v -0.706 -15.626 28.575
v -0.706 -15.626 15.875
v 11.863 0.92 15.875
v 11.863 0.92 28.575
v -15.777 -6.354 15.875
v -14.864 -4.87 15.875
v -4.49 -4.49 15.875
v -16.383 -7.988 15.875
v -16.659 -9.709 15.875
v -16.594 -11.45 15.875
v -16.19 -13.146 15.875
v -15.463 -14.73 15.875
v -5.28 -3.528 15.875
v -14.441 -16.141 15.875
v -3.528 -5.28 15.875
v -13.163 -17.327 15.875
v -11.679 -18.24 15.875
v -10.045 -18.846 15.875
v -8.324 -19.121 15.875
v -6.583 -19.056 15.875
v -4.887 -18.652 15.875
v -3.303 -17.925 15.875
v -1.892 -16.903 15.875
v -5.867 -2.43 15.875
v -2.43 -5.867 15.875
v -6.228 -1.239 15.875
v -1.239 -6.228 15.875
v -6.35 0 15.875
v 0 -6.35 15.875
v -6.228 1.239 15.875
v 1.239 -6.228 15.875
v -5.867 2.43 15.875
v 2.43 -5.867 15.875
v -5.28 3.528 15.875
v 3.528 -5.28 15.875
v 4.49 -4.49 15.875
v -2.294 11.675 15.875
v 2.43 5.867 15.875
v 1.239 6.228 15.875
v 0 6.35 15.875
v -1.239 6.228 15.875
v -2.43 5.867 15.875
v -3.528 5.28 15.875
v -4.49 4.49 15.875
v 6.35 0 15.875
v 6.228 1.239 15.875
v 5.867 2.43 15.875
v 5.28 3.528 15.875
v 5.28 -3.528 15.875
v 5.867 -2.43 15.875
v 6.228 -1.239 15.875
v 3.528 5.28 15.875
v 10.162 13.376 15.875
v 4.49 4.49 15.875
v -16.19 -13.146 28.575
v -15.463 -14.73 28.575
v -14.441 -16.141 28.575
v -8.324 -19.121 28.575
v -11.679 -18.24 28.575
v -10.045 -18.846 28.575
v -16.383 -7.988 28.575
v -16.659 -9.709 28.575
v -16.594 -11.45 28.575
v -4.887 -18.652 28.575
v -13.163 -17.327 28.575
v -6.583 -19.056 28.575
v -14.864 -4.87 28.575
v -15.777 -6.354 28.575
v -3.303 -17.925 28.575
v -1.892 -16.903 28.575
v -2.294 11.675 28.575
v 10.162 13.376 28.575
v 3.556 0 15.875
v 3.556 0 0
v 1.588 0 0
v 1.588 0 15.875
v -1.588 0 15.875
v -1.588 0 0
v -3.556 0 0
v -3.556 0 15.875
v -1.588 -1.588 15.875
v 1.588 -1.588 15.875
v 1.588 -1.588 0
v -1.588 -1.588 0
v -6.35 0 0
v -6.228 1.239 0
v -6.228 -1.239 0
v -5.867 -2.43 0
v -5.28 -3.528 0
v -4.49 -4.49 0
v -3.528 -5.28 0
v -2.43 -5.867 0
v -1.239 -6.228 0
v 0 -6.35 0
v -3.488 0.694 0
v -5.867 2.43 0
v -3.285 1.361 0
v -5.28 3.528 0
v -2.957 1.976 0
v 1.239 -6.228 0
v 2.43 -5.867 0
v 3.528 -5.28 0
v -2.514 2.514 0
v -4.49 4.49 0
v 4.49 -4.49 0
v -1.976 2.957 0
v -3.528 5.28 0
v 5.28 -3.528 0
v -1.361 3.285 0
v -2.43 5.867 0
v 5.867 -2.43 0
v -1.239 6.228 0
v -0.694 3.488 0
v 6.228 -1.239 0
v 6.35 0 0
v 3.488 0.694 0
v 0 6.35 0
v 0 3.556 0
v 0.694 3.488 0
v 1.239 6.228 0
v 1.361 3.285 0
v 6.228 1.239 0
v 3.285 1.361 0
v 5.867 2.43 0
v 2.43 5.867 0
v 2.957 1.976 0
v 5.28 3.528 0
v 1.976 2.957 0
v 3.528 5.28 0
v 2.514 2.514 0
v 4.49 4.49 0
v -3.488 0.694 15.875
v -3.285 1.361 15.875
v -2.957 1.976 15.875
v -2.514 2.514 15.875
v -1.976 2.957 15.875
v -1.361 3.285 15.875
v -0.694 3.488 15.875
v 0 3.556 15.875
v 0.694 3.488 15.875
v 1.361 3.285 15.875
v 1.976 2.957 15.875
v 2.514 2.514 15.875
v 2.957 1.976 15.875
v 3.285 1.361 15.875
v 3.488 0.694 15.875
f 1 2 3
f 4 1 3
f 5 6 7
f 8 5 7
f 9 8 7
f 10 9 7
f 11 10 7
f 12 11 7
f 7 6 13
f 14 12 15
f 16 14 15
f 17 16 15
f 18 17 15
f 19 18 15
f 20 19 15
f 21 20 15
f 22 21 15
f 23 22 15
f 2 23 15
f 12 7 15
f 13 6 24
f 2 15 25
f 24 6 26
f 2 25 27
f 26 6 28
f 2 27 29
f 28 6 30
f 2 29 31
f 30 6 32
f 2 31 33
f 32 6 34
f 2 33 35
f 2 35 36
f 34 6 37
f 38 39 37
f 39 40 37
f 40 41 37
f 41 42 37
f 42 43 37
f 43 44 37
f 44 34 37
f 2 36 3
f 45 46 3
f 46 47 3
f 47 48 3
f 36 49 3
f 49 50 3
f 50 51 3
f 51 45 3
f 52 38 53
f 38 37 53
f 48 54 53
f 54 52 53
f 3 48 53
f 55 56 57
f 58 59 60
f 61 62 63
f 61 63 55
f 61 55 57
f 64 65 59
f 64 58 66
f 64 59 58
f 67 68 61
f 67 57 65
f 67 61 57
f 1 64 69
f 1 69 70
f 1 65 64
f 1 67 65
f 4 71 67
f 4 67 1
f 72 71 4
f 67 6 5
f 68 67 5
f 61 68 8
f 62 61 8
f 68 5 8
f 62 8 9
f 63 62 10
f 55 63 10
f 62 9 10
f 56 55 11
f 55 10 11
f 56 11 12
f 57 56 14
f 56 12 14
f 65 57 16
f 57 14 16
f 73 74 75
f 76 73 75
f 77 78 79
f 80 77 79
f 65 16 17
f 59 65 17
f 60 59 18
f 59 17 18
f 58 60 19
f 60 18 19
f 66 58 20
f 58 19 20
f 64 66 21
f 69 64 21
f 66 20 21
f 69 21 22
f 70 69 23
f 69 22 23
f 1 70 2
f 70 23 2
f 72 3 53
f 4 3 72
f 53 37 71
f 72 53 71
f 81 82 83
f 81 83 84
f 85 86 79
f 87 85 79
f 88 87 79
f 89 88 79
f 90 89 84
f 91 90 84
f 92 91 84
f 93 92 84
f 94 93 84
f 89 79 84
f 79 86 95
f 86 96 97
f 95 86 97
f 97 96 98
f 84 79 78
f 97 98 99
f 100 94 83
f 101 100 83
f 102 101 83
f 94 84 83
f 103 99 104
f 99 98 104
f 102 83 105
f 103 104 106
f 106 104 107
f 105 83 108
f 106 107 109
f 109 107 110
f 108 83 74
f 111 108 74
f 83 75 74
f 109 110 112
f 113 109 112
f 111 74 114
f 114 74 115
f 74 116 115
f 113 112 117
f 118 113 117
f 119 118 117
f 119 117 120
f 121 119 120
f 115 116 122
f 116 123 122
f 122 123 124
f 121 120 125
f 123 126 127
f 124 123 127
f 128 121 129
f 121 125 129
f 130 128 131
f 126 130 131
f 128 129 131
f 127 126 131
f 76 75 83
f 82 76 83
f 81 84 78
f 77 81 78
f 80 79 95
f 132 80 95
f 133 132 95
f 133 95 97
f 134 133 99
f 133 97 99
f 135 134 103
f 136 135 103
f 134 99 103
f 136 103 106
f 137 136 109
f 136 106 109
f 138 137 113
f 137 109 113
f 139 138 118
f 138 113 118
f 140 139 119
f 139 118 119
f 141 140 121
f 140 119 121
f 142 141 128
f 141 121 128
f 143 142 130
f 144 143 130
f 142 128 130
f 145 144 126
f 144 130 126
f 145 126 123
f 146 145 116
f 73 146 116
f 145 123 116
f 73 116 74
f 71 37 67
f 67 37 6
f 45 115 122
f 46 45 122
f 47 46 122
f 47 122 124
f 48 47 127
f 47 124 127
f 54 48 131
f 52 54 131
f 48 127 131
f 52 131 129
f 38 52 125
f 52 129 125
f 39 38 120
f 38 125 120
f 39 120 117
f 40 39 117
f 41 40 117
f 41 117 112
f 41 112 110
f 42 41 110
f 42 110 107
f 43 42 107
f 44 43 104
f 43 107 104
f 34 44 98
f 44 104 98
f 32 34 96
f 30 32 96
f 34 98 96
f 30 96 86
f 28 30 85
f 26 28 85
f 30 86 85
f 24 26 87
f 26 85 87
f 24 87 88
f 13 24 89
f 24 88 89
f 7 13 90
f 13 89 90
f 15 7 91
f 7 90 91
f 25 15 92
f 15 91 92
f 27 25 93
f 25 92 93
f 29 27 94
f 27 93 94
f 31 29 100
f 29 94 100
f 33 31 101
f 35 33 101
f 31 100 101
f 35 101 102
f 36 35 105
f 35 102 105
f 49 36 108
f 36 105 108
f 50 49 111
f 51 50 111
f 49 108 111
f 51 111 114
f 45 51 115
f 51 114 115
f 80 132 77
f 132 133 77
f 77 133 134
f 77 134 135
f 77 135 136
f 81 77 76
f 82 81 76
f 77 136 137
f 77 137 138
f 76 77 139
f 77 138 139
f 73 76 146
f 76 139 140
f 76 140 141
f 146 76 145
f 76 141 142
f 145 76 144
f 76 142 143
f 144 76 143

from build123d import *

# Parameters (mm, degrees)
F0_R     = 6.35
F1_DEPTH = 15.875
F3_DEPTH = 12.7
F4_SIZE  = 8.88999


# Not quite as in the source:
# - a fillet or chamfer is up to 0.001 mm smaller than in the source, because OpenCascade refuses the exact size


with BuildPart() as f1:
    # F0 (on Top) → F1 (new body)
    with BuildSketch(Plane.XY):
        Circle(F0_R)
        with BuildLine():
            Line((-1.5875, 0), (-3.556, 0))
            ThreePointArc((-3.556, 0), (0, 3.556), (3.556, 0))
            Line((3.556, 0), (1.5875, 0))
            Line((1.5875, 0), (1.5875, -1.5875))
            Line((1.5875, -1.5875), (-1.5875, -1.5875))
            Line((-1.5875, -1.5875), (-1.5875, 0))
        make_face(mode=Mode.SUBTRACT)
    extrude(amount=F1_DEPTH)

    # F2 (on face) → F3 (join)
    with BuildSketch(Plane.XY.offset(15.875)):
        with BuildLine():
            Line((17.2411291662, 7.9984802525), (10.162283151, 13.3764016998))
            Line((10.162283151, 13.3764016998), (-13.1632656924, -17.3265325287))
            ThreePointArc((-13.1632656924, -17.3265325287), (-6.5826089488, -19.0559512579), (-0.7064982299, -15.6256079608))
            Line((-0.7064982299, -15.6256079608), (17.2411291662, 7.9984802525))
        make_face()
        with BuildLine():
            Line((-13.1632656924, -17.3265325287), (10.162283151, 13.3764016998))
            Line((10.162283151, 13.3764016998), (3.0834371358, 18.7543231471))
            Line((3.0834371358, 18.7543231471), (-14.8641902603, -4.8697650662))
            ThreePointArc((-14.8641902603, -4.8697650662), (-16.5936089895, -11.4504218098), (-13.1632656924, -17.3265325287))
        make_face()
    extrude(amount=F3_DEPTH)

    # F4 (size 8.89 in the source; OpenCascade refuses exactly that, so slightly less here)
    f4_edges = [f1.edges().sort_by_distance(p)[0] for p in [
        (3.083437, 18.754323, 22.225),
        (17.241129, 7.99848, 22.225),
    ]]
    chamfer(f4_edges, length=F4_SIZE)


solid = f1.part
